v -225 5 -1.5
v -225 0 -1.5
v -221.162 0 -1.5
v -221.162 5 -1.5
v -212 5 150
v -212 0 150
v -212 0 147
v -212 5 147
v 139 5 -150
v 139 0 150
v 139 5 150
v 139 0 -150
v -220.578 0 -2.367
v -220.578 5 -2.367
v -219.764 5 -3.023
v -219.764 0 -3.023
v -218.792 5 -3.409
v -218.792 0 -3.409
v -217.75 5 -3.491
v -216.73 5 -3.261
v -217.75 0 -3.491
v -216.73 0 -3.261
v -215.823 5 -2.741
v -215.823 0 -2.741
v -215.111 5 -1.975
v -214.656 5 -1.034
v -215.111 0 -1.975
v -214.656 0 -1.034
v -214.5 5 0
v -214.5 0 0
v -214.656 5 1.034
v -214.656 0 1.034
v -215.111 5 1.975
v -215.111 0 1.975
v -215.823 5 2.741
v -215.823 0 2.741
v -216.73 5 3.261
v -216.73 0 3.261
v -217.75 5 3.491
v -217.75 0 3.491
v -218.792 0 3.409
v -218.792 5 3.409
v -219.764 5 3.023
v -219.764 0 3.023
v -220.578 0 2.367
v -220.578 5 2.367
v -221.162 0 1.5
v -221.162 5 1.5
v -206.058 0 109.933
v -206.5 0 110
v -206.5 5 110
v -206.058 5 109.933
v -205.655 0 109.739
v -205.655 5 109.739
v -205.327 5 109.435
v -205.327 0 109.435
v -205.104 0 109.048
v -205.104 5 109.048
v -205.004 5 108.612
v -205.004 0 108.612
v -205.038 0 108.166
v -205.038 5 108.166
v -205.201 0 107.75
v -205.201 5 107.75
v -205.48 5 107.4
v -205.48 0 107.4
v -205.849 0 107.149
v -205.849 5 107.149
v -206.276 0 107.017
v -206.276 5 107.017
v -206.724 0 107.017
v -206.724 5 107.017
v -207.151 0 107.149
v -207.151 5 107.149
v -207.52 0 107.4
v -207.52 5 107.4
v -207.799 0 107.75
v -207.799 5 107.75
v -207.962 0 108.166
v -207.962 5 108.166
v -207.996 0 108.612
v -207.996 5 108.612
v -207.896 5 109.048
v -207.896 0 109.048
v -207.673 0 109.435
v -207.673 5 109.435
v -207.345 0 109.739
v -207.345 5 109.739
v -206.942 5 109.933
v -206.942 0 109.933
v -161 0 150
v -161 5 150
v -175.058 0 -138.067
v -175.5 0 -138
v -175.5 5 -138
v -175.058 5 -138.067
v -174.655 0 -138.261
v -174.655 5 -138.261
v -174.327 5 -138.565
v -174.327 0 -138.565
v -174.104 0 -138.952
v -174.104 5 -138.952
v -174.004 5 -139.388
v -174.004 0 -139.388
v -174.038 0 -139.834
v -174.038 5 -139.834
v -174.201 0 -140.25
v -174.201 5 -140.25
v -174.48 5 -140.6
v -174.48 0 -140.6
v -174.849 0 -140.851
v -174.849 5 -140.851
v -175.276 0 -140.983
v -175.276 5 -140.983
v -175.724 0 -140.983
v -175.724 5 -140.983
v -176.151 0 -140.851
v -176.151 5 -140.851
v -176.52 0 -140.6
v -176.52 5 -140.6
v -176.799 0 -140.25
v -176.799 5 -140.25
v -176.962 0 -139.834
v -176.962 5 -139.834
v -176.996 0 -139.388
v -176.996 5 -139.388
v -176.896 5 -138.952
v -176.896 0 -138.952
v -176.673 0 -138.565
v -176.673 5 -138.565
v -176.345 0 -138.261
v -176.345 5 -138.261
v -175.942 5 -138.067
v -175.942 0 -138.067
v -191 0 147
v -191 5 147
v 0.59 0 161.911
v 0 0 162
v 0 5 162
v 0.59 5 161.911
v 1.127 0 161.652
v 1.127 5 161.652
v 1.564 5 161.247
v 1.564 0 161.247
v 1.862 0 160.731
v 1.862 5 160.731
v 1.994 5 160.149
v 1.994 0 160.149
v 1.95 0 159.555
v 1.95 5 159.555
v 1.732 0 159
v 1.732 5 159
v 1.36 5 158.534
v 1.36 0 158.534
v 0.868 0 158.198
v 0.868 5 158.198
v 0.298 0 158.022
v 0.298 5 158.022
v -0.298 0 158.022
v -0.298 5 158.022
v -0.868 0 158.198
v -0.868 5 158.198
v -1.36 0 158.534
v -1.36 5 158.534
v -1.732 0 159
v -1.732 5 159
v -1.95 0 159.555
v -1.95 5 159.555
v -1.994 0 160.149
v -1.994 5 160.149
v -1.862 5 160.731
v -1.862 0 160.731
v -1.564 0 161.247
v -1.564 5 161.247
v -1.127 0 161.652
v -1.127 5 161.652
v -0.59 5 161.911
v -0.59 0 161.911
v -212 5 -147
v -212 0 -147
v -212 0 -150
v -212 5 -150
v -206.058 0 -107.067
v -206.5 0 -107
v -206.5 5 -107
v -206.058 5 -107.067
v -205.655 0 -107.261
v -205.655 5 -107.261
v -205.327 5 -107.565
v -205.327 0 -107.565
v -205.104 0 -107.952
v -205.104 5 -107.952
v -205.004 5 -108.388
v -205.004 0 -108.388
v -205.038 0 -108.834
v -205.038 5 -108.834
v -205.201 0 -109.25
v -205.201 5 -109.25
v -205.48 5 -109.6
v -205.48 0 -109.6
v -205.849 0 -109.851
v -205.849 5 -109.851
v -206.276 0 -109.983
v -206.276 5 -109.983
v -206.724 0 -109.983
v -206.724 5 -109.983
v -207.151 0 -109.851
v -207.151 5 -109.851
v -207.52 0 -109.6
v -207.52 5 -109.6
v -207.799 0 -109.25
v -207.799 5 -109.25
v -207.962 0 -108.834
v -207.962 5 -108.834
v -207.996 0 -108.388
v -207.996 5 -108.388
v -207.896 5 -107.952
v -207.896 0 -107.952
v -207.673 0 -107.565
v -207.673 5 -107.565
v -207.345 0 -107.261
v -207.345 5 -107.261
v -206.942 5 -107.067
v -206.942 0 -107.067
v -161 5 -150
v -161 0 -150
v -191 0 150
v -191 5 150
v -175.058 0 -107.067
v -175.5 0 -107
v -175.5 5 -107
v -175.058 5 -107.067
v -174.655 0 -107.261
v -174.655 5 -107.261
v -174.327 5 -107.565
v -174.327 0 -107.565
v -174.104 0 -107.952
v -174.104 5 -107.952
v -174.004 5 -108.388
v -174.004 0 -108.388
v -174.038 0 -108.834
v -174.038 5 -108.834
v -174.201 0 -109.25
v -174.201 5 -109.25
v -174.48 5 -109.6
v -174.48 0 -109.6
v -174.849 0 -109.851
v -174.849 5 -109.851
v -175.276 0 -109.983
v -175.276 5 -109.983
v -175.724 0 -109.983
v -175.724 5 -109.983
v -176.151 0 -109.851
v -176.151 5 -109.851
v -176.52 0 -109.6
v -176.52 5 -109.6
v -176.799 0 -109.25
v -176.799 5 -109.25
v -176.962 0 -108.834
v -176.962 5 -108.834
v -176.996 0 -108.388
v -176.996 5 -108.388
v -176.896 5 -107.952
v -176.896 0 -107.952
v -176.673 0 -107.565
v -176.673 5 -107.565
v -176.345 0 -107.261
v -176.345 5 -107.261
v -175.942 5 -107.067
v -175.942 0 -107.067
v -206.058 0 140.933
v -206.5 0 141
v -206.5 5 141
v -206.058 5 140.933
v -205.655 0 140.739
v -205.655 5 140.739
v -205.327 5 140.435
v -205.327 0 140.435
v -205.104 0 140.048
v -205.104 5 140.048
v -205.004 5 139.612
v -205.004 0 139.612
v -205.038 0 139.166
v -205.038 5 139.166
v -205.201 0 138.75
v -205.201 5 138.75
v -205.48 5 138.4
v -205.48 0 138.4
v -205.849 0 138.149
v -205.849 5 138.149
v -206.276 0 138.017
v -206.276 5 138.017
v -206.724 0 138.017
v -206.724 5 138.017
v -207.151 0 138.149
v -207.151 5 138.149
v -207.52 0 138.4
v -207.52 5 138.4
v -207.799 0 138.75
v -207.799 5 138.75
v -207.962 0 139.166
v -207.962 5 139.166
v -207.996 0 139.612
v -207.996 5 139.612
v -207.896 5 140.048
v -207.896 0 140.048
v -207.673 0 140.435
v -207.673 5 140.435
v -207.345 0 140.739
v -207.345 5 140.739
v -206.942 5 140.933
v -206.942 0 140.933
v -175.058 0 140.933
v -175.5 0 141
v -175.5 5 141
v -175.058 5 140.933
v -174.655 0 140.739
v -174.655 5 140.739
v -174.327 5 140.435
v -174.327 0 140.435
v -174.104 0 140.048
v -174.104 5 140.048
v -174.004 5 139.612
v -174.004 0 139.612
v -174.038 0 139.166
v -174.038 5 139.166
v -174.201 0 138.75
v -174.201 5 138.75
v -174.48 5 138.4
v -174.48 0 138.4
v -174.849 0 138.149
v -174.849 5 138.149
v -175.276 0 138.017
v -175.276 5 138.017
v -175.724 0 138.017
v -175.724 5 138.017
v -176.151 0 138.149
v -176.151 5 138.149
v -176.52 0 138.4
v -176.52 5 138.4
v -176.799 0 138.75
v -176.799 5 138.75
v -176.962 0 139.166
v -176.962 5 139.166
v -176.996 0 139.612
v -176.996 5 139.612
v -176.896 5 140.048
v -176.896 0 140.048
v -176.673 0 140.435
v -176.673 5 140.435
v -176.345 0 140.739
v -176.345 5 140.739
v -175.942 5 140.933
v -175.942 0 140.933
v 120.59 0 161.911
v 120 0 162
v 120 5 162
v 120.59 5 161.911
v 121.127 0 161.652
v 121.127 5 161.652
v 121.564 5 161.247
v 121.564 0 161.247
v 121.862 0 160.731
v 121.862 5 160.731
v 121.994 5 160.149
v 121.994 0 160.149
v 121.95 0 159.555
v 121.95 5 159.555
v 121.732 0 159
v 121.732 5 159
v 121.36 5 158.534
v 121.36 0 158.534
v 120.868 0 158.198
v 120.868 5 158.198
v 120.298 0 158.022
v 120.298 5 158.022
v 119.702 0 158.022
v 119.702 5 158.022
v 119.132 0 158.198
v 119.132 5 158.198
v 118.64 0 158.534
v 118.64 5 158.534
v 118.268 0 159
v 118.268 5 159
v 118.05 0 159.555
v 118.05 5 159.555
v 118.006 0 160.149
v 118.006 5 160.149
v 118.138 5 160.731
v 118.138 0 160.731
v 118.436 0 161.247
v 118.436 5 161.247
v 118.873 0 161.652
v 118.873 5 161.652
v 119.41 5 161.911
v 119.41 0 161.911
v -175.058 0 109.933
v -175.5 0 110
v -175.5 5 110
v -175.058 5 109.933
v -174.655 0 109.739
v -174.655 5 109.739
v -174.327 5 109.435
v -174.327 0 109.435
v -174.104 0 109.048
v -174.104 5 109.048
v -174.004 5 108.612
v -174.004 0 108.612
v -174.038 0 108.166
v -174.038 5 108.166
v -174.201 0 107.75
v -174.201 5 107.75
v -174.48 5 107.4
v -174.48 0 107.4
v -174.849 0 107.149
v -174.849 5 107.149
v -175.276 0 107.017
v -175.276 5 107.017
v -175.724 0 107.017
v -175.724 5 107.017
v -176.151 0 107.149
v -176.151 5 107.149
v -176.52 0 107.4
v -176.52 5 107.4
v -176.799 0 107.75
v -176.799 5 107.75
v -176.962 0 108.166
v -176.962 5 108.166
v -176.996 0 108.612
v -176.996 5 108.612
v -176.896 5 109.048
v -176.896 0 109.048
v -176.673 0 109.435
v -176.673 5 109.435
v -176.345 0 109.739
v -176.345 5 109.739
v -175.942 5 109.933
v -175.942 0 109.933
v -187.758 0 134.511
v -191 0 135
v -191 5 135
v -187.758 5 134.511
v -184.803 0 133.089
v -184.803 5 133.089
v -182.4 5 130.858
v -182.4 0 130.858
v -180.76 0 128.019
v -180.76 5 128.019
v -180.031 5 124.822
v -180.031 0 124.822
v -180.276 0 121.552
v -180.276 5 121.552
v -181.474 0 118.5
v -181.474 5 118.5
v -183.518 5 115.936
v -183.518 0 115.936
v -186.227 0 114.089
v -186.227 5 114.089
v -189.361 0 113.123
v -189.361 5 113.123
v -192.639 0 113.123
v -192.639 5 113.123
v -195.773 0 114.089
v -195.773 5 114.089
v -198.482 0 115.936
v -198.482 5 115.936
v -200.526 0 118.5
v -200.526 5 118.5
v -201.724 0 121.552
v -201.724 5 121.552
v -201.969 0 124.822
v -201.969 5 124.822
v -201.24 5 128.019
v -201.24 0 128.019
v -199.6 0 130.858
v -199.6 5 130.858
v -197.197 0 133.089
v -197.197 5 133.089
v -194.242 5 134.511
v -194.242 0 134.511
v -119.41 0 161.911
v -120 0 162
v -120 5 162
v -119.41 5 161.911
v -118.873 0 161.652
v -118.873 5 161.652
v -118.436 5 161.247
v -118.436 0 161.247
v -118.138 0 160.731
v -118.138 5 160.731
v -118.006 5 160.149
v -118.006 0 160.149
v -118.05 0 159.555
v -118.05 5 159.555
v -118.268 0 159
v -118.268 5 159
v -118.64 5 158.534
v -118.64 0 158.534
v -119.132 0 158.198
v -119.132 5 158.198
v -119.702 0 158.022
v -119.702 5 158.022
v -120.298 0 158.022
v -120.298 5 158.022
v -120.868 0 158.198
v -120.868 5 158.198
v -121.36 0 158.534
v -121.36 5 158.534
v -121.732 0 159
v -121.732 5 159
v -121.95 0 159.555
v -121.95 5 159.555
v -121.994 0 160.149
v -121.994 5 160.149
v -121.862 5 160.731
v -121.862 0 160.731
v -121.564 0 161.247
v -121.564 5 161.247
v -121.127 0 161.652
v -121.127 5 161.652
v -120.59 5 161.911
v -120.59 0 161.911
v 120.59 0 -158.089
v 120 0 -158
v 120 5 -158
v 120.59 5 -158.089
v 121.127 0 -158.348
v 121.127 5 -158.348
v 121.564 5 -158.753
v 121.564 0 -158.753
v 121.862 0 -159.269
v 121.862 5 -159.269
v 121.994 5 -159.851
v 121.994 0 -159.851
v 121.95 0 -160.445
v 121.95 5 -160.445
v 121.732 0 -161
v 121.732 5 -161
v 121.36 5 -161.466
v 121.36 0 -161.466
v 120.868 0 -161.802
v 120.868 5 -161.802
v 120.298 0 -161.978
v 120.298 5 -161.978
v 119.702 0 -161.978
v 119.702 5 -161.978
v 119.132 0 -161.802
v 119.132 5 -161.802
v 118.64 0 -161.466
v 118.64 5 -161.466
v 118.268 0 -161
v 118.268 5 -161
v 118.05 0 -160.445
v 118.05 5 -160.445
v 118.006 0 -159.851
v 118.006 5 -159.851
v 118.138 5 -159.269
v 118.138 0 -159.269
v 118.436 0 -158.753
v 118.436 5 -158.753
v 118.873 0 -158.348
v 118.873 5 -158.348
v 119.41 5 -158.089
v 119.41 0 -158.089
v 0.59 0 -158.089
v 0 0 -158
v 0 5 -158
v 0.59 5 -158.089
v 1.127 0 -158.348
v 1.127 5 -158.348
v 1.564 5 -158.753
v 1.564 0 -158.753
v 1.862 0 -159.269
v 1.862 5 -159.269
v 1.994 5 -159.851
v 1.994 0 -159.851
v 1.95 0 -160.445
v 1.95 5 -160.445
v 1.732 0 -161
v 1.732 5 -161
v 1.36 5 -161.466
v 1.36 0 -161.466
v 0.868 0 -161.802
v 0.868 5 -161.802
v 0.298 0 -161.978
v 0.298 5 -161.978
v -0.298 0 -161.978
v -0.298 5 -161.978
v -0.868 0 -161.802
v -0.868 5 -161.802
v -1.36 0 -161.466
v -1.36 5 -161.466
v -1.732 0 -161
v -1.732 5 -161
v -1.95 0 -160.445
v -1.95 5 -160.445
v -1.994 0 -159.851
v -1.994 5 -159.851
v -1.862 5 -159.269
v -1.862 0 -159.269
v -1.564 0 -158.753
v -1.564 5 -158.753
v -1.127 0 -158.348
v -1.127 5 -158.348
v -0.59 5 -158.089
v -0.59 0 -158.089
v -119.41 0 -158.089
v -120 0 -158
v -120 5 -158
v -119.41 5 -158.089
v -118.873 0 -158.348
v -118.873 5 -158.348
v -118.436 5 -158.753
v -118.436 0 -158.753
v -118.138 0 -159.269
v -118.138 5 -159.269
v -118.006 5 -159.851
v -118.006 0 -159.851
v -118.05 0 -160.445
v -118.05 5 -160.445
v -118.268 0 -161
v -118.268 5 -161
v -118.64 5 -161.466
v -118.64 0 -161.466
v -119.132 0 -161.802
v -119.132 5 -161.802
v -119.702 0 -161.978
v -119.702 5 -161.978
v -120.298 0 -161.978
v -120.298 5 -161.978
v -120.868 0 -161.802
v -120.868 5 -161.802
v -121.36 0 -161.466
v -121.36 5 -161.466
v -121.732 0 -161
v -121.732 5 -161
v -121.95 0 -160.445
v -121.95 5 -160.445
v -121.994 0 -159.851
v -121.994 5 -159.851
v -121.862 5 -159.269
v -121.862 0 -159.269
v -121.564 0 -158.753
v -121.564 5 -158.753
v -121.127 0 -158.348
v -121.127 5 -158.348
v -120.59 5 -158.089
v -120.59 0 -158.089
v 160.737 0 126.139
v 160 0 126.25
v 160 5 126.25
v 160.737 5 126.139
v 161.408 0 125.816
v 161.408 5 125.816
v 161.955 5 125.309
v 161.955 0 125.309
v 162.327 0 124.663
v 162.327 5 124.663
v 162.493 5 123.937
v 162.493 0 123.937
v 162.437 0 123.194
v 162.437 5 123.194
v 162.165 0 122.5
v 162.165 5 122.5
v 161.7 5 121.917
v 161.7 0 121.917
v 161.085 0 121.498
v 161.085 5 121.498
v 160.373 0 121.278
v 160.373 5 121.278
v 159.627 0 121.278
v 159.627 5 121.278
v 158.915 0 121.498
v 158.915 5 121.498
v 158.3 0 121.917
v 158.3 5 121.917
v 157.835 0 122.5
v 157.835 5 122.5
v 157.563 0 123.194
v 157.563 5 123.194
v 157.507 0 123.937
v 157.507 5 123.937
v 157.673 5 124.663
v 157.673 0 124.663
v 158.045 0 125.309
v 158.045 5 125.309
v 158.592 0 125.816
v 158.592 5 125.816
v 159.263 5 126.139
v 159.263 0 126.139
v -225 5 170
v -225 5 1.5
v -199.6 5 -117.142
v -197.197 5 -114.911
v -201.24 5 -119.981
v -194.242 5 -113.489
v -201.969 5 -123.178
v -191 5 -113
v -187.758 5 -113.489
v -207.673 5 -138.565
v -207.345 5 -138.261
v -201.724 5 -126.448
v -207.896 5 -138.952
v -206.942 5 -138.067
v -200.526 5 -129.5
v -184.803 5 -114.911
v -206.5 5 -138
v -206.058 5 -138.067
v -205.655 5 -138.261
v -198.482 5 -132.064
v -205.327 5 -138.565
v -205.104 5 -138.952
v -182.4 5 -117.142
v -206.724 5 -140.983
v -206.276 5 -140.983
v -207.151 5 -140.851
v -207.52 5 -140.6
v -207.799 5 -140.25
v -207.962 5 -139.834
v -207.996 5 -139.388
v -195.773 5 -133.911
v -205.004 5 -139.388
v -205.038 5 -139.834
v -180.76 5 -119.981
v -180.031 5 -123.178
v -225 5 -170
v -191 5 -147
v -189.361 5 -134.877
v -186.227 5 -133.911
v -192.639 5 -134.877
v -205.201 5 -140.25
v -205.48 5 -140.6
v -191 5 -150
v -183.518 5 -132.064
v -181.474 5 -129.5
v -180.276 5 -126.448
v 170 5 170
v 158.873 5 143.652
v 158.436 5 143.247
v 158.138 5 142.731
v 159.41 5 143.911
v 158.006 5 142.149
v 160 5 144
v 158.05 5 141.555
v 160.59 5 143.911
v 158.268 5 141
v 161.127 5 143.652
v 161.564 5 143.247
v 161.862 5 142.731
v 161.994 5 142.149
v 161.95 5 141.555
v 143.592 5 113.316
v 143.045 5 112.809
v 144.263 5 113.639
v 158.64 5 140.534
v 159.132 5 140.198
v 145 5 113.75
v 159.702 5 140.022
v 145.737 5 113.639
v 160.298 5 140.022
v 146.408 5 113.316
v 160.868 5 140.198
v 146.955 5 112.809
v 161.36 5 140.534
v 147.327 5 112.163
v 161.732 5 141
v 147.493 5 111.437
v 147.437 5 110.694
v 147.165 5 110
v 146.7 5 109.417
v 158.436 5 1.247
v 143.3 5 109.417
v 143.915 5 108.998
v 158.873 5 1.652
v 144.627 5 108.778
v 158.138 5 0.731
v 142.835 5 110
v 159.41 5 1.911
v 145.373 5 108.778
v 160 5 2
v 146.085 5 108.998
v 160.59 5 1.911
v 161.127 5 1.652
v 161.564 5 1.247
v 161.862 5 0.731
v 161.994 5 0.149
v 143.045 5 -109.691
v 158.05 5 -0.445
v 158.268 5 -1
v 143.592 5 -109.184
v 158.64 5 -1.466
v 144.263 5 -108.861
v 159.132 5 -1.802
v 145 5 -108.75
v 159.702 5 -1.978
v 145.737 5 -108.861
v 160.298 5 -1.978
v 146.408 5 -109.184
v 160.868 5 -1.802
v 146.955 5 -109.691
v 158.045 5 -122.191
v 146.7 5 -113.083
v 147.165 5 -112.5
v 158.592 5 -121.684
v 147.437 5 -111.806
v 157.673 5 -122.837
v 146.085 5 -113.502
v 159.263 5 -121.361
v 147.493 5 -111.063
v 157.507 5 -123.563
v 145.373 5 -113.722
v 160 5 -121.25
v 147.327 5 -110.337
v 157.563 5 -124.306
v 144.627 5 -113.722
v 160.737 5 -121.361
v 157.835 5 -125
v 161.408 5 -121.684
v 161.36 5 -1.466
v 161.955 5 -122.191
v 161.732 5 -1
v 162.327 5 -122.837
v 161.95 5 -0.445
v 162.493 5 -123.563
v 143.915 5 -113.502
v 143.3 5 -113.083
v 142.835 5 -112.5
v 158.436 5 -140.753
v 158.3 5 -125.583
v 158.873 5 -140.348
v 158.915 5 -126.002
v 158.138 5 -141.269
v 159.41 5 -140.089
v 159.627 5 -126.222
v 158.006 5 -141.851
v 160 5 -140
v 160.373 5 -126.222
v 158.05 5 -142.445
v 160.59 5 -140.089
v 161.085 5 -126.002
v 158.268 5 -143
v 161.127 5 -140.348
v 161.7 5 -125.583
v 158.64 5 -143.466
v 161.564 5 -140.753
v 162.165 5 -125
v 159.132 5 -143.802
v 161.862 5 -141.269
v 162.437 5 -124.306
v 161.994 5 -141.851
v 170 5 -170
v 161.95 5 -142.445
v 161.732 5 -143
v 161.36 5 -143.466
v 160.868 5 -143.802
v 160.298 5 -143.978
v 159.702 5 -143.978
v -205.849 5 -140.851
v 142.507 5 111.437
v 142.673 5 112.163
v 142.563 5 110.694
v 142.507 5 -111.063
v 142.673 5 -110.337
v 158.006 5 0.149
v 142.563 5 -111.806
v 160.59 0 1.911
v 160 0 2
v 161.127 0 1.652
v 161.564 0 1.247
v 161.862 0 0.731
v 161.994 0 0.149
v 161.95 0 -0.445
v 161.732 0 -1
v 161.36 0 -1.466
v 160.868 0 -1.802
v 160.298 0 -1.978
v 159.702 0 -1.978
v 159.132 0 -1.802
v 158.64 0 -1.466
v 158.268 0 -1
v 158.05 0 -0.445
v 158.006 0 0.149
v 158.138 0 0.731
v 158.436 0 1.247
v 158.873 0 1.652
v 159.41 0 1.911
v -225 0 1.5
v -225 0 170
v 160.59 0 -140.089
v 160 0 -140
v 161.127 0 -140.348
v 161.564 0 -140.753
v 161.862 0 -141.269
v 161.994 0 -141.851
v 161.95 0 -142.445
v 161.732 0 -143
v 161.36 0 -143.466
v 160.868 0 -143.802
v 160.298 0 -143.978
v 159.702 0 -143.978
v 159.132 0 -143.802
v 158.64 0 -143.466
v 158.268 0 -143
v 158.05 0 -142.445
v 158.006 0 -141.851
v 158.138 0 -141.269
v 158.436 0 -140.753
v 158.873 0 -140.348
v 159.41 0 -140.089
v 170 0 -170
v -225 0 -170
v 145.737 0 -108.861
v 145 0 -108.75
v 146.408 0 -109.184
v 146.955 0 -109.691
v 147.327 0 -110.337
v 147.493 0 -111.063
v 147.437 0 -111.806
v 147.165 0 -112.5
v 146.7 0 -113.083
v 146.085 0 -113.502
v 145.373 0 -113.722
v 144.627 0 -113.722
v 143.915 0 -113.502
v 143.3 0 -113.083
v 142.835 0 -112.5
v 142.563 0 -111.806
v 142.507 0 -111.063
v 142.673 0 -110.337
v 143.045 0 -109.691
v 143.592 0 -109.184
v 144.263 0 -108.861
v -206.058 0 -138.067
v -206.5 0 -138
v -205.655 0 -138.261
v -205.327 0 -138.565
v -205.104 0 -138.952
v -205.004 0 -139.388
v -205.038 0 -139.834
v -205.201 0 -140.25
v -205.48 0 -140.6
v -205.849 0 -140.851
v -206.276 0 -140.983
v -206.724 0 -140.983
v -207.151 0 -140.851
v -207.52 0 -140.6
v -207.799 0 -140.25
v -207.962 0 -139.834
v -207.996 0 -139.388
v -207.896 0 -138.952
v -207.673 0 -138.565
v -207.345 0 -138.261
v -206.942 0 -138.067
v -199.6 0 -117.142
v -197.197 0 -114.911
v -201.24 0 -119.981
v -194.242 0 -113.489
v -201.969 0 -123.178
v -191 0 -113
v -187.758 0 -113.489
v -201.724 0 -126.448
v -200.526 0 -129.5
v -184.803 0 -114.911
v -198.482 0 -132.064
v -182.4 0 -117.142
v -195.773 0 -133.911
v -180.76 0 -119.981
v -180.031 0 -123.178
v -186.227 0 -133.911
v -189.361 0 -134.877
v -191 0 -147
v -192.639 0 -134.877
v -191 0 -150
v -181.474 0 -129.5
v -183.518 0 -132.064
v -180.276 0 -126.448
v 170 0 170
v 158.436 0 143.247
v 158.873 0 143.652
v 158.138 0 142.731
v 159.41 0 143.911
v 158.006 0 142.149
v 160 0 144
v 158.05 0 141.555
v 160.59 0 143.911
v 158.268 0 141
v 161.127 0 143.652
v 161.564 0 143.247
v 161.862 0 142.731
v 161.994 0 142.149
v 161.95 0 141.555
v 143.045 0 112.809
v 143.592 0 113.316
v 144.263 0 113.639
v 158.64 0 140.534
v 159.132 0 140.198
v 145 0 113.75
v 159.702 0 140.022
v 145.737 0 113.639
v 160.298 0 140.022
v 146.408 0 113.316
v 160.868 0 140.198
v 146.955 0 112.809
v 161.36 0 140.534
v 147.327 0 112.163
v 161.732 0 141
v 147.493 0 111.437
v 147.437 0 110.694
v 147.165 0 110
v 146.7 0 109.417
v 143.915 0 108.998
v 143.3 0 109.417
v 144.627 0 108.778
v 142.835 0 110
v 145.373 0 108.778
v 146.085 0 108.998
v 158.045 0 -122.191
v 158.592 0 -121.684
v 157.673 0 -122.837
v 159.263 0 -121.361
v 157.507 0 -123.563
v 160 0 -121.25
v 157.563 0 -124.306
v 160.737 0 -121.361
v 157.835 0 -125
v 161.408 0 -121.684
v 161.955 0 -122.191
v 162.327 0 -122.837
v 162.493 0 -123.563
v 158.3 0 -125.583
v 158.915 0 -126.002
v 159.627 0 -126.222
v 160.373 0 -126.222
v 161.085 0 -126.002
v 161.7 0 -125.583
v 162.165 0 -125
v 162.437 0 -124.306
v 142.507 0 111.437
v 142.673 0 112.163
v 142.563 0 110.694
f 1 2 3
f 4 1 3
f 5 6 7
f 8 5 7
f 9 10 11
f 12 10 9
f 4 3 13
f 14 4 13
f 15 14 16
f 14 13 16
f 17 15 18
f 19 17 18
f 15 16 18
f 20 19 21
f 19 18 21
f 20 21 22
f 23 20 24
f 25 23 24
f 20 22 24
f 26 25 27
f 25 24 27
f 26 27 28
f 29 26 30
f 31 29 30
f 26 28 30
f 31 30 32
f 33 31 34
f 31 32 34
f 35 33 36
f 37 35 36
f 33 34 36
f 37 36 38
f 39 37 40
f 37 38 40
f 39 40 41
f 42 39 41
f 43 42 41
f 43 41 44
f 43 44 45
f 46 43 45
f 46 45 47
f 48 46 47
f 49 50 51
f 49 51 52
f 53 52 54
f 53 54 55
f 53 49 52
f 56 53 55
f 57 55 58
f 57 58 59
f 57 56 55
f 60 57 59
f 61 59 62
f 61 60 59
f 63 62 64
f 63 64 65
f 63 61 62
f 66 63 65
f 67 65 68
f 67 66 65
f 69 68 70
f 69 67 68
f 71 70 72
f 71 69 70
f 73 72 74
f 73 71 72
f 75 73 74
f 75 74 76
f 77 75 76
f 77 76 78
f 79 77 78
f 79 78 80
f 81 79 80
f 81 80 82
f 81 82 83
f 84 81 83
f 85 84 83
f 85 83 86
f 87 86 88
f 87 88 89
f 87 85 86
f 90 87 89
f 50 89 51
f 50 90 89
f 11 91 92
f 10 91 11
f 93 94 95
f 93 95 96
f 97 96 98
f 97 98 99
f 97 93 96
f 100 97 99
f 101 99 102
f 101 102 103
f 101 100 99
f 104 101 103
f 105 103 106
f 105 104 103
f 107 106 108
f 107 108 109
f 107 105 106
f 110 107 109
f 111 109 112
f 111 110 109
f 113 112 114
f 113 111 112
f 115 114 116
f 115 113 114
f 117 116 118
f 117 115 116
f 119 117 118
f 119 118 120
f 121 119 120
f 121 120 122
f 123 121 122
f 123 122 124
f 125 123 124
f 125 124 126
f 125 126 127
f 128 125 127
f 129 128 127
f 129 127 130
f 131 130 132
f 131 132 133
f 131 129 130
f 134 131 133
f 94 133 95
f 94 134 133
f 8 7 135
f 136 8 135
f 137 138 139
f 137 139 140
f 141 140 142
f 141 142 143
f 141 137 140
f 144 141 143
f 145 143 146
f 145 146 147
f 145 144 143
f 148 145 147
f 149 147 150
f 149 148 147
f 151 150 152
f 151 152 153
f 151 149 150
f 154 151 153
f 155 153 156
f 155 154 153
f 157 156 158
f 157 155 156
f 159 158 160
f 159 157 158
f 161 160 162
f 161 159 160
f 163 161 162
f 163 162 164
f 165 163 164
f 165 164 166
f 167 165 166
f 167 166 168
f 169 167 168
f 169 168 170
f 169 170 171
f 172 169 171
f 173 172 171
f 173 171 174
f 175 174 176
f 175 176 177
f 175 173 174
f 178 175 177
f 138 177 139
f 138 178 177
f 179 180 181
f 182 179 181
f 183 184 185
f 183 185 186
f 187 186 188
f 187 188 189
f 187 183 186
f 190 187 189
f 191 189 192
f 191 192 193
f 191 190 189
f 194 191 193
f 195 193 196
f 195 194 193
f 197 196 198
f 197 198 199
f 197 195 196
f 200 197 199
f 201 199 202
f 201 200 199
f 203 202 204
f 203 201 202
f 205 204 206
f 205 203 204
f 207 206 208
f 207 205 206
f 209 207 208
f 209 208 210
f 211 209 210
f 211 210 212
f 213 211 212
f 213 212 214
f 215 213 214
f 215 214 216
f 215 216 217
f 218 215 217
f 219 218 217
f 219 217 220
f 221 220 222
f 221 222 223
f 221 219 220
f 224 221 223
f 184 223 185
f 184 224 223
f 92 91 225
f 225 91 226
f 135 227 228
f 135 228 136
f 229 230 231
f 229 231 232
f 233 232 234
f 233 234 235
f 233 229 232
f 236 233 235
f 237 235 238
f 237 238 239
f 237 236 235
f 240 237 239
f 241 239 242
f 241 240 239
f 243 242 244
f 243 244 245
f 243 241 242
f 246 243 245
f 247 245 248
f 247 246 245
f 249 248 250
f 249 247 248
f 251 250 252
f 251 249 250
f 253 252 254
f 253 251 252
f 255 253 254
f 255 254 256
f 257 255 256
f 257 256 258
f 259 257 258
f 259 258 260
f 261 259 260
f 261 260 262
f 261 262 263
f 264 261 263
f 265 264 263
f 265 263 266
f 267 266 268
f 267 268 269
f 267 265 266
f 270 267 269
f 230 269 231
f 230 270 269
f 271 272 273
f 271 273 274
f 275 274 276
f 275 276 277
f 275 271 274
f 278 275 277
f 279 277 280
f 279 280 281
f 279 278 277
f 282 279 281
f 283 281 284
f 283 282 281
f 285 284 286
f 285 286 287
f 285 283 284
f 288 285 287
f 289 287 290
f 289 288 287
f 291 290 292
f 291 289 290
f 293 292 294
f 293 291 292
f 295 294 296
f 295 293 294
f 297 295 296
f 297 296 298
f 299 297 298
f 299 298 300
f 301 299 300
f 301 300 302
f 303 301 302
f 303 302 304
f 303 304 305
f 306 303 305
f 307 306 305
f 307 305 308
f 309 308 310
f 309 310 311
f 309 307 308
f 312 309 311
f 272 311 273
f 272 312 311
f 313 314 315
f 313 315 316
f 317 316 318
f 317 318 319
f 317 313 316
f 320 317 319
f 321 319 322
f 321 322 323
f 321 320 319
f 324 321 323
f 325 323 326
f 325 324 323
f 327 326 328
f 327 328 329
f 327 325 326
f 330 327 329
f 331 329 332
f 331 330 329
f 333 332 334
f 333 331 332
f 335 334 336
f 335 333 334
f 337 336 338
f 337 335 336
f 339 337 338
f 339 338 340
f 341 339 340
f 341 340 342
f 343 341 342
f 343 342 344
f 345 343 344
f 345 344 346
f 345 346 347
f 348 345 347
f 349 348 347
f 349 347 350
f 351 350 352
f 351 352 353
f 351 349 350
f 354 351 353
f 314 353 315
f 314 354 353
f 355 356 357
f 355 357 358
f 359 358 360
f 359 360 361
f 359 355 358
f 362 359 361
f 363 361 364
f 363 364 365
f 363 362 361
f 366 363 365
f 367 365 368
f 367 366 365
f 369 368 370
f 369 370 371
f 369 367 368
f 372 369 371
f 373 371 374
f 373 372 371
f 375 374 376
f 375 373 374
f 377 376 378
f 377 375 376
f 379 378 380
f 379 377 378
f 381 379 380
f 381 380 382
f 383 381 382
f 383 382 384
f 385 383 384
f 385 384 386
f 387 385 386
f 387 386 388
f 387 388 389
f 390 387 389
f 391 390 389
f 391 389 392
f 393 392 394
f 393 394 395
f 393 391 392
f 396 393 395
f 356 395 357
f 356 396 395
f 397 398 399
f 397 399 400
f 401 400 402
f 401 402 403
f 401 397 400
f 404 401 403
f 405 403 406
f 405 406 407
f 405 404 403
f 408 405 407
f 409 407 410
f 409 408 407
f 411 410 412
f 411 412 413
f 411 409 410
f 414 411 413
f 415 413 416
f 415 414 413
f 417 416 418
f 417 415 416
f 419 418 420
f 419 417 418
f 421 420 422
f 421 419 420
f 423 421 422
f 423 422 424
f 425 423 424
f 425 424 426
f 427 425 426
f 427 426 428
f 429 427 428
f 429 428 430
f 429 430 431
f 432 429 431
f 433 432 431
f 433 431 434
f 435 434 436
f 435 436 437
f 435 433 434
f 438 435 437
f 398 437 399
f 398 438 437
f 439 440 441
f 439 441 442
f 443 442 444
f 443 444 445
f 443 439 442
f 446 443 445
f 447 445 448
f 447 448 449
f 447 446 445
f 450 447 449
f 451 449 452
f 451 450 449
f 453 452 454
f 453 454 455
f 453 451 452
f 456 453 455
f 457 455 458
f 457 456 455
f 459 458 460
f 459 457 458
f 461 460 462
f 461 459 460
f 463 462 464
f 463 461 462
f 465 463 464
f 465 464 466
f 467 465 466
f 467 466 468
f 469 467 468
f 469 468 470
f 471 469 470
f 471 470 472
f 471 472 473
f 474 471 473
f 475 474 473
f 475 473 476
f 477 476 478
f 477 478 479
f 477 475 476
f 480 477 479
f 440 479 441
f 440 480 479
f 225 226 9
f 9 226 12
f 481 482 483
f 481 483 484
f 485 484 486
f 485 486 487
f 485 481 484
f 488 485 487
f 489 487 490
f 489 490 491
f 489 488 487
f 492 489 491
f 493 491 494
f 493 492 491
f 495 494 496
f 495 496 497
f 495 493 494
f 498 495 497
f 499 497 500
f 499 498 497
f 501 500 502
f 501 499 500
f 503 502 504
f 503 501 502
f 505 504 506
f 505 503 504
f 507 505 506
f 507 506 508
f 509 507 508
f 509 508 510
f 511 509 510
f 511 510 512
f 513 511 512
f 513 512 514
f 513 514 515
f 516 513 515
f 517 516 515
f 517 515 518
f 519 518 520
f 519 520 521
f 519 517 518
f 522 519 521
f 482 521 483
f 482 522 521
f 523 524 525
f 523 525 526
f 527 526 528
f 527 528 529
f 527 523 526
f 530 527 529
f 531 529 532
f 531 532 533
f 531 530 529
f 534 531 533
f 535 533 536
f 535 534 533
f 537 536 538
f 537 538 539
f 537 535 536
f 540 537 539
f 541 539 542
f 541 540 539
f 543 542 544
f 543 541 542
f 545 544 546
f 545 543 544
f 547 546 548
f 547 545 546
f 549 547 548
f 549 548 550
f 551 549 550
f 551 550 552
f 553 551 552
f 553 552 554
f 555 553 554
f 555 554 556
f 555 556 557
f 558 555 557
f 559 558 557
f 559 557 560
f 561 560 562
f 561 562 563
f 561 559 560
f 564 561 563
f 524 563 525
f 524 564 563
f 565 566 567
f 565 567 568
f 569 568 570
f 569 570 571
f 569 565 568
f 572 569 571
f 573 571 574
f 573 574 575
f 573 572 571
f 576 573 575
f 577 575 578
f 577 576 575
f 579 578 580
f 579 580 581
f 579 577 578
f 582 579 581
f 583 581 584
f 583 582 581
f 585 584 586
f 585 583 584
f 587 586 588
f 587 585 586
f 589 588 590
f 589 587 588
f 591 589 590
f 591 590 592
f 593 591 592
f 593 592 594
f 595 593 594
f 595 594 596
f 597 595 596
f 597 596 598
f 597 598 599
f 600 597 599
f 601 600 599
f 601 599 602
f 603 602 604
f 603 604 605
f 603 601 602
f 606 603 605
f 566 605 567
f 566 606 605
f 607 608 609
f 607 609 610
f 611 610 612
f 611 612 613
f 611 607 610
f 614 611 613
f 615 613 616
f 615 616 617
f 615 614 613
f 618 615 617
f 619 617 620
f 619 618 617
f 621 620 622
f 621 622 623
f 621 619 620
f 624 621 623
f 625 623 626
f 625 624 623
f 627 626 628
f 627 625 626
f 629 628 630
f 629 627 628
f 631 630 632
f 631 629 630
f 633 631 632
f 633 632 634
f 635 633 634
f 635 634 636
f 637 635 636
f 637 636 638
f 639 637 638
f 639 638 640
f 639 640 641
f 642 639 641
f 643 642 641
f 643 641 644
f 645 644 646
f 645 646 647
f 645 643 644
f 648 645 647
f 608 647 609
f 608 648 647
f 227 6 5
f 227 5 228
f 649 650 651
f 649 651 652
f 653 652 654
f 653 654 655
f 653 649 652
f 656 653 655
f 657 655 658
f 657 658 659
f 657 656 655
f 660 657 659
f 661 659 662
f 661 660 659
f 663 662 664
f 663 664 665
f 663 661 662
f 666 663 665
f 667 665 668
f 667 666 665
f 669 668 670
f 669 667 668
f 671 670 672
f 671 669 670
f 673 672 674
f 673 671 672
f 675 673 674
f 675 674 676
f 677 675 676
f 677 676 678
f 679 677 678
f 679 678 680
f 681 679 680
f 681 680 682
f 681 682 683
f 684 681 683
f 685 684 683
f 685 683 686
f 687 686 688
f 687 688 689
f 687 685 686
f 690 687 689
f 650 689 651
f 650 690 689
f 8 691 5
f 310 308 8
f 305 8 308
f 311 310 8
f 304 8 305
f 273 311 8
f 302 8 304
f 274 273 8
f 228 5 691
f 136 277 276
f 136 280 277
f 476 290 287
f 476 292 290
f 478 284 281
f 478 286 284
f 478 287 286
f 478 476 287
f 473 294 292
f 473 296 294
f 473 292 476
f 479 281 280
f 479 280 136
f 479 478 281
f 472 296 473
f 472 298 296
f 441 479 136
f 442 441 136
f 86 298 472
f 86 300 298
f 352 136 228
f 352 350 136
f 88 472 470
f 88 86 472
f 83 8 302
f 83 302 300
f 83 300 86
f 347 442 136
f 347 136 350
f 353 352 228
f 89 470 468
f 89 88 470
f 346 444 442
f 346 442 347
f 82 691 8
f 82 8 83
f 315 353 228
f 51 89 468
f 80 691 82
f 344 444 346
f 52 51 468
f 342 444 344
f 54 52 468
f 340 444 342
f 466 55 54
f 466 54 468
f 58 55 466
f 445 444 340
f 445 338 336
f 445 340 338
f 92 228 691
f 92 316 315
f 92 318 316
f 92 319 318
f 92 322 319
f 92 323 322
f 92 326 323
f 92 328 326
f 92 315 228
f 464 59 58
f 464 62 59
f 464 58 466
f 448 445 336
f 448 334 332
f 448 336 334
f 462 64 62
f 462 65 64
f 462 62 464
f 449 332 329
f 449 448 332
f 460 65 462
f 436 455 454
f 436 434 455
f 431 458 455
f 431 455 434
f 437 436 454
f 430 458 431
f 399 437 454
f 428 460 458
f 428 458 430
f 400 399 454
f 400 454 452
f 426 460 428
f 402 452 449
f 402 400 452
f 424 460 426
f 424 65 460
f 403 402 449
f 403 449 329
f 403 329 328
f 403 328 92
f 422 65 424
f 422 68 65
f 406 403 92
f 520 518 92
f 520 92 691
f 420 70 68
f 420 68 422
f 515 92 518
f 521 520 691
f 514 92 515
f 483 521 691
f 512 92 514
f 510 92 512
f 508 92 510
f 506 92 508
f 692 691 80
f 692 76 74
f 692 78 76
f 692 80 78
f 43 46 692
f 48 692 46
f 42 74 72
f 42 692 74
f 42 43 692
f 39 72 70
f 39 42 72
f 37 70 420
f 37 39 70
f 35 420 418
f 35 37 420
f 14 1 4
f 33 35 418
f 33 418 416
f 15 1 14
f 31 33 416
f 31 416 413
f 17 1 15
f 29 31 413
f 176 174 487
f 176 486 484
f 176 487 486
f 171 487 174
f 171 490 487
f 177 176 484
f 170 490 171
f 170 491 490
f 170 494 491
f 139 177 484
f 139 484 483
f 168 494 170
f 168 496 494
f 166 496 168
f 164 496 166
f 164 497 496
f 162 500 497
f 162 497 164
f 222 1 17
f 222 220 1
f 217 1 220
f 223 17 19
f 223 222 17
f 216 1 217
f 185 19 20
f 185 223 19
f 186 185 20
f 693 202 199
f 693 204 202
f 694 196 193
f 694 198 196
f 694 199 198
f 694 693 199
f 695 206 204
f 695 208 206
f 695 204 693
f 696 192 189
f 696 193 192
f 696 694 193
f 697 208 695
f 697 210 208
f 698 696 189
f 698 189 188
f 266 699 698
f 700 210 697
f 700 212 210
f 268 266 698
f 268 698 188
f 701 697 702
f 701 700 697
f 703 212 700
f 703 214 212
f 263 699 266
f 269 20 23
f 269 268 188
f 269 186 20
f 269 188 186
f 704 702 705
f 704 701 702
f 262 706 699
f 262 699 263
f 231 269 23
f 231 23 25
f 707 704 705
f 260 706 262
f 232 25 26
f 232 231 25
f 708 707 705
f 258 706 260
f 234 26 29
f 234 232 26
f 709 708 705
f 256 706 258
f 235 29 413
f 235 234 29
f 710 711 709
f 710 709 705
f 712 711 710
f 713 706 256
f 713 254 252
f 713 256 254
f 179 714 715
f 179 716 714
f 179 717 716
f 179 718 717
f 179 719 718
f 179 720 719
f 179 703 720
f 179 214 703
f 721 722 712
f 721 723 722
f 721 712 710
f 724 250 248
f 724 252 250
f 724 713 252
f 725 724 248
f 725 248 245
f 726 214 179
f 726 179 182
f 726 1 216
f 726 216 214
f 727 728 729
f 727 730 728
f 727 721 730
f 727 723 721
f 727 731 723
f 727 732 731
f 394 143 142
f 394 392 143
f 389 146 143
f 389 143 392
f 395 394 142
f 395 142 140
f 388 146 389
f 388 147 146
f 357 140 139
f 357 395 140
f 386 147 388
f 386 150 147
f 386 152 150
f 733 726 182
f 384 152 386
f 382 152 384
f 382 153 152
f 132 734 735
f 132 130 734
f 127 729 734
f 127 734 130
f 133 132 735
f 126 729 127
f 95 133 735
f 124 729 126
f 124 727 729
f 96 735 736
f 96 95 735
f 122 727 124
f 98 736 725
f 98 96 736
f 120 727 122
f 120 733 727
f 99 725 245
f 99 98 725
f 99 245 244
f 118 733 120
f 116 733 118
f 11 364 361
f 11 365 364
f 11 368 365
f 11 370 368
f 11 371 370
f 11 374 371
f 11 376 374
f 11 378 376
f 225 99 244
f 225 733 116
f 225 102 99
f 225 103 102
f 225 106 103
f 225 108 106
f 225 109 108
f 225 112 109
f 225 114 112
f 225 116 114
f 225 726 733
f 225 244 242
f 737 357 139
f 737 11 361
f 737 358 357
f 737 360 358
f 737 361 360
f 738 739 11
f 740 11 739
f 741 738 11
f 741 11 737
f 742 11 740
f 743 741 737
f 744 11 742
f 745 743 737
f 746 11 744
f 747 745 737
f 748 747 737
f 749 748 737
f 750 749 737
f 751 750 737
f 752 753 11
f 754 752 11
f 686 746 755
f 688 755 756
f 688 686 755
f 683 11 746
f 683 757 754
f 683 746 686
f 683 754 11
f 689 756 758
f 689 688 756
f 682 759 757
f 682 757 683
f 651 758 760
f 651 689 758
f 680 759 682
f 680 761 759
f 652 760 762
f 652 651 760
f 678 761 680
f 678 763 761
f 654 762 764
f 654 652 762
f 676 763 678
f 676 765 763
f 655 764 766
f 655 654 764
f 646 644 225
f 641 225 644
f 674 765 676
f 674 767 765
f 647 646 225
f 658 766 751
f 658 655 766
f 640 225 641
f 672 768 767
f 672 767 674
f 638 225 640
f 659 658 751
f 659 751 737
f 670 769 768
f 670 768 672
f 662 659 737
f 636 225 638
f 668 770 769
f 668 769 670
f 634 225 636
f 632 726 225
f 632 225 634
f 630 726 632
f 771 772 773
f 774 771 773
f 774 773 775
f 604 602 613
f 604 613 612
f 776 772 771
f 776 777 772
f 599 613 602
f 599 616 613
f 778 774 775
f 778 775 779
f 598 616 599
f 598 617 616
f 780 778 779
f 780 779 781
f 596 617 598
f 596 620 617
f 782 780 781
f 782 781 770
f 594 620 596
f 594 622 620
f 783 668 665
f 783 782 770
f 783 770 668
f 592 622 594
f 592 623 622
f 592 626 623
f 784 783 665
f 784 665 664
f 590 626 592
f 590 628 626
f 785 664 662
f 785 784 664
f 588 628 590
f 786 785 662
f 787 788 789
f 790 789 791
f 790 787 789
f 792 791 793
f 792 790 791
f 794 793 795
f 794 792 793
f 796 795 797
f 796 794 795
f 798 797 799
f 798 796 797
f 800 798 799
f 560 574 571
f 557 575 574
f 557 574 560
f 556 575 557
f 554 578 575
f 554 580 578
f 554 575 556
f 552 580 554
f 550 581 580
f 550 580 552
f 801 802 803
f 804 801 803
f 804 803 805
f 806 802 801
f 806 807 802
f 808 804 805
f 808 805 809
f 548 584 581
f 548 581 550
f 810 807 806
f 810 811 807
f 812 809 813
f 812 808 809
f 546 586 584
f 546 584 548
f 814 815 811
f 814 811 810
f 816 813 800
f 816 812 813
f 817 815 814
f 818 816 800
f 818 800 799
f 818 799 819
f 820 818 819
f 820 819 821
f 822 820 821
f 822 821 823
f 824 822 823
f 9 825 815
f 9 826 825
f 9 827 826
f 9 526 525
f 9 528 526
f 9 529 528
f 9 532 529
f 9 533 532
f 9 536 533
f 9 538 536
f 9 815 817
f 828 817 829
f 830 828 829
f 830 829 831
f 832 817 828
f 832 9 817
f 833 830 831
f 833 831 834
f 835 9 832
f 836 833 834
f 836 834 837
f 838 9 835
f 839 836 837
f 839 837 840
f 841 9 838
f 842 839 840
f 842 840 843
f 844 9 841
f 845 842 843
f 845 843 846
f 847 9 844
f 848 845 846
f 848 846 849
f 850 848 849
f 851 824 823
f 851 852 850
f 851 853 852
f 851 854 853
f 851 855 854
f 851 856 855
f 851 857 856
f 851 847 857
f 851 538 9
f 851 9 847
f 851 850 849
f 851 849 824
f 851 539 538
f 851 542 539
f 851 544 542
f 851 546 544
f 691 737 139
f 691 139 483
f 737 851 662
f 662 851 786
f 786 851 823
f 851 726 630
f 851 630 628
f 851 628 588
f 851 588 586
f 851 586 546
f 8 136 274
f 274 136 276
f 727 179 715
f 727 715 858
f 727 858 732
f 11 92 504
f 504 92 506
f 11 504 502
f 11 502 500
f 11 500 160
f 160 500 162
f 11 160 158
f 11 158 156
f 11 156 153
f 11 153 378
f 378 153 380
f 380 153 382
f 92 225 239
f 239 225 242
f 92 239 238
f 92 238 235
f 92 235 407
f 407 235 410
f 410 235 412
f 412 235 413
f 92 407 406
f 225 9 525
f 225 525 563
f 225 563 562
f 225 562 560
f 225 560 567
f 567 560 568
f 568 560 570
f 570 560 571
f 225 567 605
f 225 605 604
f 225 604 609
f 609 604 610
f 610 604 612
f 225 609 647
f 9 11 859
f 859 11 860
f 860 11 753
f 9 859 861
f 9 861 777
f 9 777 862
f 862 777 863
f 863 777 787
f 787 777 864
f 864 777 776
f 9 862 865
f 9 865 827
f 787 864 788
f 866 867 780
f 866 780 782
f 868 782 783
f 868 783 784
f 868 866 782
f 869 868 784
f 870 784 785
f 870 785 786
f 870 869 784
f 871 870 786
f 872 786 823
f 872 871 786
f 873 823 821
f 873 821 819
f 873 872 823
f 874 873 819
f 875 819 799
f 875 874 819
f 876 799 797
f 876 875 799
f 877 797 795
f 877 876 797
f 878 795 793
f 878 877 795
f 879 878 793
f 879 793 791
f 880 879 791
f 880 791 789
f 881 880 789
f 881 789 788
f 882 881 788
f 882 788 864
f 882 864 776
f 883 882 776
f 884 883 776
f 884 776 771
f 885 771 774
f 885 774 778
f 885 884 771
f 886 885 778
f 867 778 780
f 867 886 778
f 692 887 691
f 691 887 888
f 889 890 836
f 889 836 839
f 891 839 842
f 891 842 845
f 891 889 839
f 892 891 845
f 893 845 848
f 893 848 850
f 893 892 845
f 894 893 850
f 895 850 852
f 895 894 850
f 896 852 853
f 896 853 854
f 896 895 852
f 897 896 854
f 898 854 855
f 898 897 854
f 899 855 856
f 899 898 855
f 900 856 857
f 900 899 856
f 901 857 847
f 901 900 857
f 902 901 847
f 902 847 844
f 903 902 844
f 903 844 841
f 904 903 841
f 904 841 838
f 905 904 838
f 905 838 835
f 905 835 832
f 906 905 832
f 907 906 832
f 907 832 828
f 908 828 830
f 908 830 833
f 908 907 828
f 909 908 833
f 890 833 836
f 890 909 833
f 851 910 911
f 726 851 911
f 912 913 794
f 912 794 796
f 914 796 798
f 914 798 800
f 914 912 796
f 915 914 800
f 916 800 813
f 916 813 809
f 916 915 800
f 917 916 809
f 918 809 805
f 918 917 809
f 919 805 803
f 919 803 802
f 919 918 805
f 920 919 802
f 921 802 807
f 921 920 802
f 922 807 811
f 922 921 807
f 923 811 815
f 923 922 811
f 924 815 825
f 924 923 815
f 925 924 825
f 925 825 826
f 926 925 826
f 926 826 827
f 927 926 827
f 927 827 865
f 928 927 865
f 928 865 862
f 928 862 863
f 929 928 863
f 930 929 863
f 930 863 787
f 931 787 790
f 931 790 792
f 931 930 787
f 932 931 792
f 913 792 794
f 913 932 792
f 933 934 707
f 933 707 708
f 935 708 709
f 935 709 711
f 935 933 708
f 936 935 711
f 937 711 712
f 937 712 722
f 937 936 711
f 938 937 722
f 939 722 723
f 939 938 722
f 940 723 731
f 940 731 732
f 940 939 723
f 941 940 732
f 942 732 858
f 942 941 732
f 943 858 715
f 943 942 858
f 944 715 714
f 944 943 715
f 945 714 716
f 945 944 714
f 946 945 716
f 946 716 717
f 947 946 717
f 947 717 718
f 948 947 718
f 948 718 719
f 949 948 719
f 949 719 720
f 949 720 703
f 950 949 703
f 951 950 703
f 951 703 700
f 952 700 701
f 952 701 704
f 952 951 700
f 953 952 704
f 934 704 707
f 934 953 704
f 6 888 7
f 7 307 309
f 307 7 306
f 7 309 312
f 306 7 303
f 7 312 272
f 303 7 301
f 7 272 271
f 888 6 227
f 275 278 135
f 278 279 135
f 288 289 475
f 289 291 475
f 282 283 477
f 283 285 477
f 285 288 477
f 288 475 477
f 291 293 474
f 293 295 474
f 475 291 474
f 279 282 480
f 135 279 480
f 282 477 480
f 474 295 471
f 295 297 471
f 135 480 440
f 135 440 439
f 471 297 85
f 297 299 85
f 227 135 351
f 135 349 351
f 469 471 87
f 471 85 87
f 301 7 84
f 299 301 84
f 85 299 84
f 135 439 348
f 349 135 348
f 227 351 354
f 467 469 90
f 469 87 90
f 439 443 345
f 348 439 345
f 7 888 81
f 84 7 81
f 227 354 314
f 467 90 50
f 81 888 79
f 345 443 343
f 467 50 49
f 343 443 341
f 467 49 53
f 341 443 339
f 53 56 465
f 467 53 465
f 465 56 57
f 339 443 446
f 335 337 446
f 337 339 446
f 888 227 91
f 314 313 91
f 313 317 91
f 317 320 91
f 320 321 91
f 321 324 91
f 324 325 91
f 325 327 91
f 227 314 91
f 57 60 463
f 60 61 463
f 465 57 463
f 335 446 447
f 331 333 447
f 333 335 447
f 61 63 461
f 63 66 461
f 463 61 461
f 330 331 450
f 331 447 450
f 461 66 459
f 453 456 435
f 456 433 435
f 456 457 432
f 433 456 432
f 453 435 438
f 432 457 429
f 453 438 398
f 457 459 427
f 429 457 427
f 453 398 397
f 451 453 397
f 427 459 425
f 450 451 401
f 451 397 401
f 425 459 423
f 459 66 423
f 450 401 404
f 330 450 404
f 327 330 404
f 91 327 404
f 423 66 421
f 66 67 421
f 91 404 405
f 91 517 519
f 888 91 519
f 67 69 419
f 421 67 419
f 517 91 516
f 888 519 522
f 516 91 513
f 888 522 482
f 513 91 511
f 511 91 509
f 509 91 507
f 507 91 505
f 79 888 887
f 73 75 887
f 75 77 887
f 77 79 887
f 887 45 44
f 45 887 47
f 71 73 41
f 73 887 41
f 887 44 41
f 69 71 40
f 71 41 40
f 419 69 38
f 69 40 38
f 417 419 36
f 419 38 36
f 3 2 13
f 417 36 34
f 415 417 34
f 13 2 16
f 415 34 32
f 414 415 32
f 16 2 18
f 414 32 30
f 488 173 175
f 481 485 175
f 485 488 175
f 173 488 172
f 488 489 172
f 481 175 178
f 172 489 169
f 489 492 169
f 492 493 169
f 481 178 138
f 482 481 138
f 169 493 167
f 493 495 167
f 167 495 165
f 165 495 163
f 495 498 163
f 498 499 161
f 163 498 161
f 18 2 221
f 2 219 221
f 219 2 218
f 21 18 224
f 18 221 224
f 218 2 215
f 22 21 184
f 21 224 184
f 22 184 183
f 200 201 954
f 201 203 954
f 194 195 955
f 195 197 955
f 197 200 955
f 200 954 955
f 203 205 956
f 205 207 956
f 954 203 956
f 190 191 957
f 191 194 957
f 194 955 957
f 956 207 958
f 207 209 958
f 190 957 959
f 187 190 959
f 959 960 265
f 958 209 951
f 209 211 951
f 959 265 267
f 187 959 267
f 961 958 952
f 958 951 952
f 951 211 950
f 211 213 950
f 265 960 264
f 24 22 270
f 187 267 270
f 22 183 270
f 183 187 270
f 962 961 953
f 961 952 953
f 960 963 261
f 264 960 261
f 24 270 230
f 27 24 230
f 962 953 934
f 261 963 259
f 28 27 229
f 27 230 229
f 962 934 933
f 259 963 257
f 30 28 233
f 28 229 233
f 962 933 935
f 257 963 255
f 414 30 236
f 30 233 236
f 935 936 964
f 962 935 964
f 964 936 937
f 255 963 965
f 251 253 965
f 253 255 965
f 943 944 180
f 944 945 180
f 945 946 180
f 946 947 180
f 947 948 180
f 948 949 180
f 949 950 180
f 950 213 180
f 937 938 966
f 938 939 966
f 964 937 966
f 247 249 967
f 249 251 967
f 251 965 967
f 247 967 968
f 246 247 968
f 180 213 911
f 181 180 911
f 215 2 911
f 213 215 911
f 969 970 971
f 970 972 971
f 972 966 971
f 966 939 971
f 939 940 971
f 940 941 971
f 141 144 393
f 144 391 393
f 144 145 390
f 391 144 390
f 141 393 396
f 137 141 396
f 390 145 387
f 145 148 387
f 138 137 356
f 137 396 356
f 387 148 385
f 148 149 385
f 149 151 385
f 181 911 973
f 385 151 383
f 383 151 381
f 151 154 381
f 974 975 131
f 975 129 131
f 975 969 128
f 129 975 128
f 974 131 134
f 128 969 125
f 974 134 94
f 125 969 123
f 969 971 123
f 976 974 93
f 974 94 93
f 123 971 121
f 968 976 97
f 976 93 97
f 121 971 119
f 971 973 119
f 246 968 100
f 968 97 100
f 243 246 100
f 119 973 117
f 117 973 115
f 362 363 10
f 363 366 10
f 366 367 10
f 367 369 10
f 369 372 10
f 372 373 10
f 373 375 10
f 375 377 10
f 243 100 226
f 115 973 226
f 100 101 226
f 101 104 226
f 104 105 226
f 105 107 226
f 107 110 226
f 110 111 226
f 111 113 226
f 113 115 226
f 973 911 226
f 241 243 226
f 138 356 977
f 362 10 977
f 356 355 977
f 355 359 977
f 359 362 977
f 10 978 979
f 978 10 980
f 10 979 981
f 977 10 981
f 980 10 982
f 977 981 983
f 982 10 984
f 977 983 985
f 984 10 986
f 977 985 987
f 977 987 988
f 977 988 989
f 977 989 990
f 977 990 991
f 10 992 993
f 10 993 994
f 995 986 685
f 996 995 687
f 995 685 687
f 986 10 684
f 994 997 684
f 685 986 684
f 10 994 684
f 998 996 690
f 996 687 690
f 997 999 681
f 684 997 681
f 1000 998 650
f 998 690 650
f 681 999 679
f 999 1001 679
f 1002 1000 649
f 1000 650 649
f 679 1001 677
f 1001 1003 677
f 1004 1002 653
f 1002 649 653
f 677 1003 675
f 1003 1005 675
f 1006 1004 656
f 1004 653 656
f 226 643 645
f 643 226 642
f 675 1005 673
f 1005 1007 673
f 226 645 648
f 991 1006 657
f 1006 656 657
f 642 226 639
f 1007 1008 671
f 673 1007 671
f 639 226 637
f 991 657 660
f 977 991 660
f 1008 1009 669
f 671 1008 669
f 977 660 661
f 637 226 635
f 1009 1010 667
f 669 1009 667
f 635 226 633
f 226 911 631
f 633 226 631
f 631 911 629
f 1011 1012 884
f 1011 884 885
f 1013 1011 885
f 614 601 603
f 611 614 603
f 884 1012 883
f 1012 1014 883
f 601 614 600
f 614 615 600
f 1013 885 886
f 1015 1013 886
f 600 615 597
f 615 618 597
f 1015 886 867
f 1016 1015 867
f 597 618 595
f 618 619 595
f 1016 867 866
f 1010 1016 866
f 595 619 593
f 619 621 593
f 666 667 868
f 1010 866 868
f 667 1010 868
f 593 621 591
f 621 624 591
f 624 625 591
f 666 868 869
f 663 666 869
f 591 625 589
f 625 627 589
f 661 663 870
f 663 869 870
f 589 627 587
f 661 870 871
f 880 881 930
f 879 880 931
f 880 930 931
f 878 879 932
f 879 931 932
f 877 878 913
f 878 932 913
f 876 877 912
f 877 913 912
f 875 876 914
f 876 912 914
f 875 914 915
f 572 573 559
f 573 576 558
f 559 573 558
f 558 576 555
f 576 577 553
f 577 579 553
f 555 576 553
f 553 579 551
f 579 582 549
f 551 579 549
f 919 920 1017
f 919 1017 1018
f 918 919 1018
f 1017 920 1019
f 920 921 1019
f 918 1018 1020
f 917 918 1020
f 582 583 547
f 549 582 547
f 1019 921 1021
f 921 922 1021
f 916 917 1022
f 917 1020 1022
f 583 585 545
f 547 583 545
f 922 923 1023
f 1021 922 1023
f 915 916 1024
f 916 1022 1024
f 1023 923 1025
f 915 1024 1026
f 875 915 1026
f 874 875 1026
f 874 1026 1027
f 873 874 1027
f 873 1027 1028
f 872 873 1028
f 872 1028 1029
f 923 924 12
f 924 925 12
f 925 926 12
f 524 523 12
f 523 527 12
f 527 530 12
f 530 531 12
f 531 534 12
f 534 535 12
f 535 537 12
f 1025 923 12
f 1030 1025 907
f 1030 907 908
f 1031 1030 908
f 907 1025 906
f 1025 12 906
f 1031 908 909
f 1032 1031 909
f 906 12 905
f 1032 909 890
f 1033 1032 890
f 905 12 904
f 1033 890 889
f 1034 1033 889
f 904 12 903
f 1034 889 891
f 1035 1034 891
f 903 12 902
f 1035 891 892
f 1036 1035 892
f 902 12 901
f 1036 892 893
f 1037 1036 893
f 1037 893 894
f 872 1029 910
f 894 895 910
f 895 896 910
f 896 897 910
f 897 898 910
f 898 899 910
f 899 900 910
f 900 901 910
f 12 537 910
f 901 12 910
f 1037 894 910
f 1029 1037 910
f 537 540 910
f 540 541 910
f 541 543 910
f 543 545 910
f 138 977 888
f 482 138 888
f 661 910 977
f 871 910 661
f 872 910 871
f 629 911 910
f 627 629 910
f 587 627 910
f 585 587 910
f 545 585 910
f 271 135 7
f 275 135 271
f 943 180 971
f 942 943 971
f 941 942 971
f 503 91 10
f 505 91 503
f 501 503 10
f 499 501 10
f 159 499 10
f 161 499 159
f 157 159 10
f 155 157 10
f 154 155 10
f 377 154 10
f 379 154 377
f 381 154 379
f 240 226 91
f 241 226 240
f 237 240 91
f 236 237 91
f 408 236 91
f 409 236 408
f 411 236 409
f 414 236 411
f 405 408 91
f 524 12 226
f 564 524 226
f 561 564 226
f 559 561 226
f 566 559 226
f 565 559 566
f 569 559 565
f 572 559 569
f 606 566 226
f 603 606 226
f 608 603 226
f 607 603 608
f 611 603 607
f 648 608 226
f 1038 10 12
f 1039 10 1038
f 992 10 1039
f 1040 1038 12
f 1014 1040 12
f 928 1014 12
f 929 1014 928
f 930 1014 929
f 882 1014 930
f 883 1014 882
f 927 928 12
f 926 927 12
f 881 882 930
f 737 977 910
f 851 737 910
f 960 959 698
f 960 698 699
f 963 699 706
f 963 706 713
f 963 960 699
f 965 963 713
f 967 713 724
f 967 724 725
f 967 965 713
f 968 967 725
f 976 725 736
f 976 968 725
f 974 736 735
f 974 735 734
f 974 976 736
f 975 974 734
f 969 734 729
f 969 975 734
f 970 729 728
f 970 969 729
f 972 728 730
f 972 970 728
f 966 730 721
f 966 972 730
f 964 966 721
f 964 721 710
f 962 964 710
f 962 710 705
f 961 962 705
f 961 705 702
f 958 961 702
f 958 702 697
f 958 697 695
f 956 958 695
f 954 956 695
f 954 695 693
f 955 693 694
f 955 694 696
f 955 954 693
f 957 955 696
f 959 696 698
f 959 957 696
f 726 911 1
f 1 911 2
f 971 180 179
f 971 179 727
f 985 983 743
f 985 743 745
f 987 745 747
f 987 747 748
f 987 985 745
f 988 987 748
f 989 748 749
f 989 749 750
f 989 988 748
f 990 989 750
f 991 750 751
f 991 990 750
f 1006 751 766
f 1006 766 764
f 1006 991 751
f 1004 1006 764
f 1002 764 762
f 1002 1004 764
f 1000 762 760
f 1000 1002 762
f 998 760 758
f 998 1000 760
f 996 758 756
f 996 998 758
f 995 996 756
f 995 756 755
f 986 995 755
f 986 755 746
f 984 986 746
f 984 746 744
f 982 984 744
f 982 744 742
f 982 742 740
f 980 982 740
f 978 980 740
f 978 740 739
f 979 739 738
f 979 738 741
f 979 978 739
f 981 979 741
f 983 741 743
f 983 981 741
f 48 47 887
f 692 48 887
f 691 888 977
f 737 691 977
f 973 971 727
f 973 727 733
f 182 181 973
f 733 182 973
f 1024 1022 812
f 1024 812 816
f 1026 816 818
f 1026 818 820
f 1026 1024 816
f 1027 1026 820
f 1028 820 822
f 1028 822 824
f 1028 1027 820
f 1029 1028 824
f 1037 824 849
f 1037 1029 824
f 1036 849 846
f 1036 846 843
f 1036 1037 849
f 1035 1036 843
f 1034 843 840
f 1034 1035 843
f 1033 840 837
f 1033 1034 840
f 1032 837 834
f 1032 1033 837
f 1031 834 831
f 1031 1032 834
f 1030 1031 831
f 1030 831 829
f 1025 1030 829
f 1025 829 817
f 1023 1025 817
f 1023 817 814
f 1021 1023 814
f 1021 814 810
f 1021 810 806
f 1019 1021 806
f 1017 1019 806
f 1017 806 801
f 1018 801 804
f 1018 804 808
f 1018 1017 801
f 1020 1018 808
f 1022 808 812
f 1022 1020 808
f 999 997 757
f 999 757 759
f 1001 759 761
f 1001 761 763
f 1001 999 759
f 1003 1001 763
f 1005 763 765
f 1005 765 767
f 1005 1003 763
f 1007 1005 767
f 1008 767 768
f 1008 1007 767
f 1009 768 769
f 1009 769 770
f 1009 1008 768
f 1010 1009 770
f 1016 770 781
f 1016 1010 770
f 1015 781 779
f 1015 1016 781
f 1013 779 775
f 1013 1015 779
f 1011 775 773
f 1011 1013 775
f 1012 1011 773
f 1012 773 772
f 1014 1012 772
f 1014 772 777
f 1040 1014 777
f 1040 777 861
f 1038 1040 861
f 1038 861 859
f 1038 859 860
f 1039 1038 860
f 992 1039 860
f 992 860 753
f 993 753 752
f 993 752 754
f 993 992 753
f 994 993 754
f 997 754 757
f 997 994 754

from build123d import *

# Parameters (mm, degrees)
SKETCH1_9_W         = 300
SKETCH1_9_H         = 300
SKETCH1_9_R         = 2
SKETCH1_9_R_2       = 2.5
SKETCH1_9_W_2       = 21
SKETCH1_9_H_2       = 3
SKETCH1_9_R_3       = 11
SKETCH1_9_R_4       = 1.5
BOSS_EXTRUDE7_DEPTH = 5


with BuildPart() as part:
    # Sketch1<9> → Boss-Extrude7 (new body)
    with BuildSketch(Plane(origin=(0, 0, 0), x_dir=(1, 0, 0), z_dir=(0, 1, 0))):
        with BuildLine():
            Line((170, 170), (-225, 170))
            Line((-225, 170), (-225, 1.5))
            Line((-225, 1.5), (-221.16227766, 1.5))
            ThreePointArc((-221.16227766, 1.5), (-214.5, 0), (-221.16227766, -1.5))
            Line((-221.16227766, -1.5), (-225, -1.5))
            Line((-225, -1.5), (-225, -170))
            Line((-225, -170), (170, -170))
            Line((170, -170), (170, 170))
        make_face()
        with Locations((-11, 0)):
            Rectangle(SKETCH1_9_W, SKETCH1_9_H, mode=Mode.SUBTRACT)
        with Locations((160, -142)):
            Circle(SKETCH1_9_R, mode=Mode.SUBTRACT)
        with Locations((160, -123.75)):
            Circle(SKETCH1_9_R_2, mode=Mode.SUBTRACT)
        with Locations((145, -111.25)):
            Circle(SKETCH1_9_R_2, mode=Mode.SUBTRACT)
        with Locations((160, 0)):
            Circle(SKETCH1_9_R, mode=Mode.SUBTRACT)
        with Locations((145, 111.25)):
            Circle(SKETCH1_9_R_2, mode=Mode.SUBTRACT)
        with Locations((160, 123.75)):
            Circle(SKETCH1_9_R_2, mode=Mode.SUBTRACT)
        with Locations((160, 142)):
            Circle(SKETCH1_9_R, mode=Mode.SUBTRACT)
        with Locations((120, -160)):
            Circle(SKETCH1_9_R, mode=Mode.SUBTRACT)
        with Locations((-120, -160)):
            Circle(SKETCH1_9_R, mode=Mode.SUBTRACT)
        with Locations((0, -160)):
            Circle(SKETCH1_9_R, mode=Mode.SUBTRACT)
        with Locations((120, 160)):
            Circle(SKETCH1_9_R, mode=Mode.SUBTRACT)
        with Locations((-120, 160)):
            Circle(SKETCH1_9_R, mode=Mode.SUBTRACT)
        with Locations((0, 160)):
            Circle(SKETCH1_9_R, mode=Mode.SUBTRACT)
        with Locations((-201.5, 148.5)):
            Rectangle(SKETCH1_9_W_2, SKETCH1_9_H_2, mode=Mode.SUBTRACT)
        with Locations((-201.5, -148.5)):
            Rectangle(SKETCH1_9_W_2, SKETCH1_9_H_2, mode=Mode.SUBTRACT)
        with Locations((-191, -124)):
            Circle(SKETCH1_9_R_3, mode=Mode.SUBTRACT)
        with Locations((-206.5, -108.5)):
            Circle(SKETCH1_9_R_4, mode=Mode.SUBTRACT)
        with Locations((-175.5, -108.5)):
            Circle(SKETCH1_9_R_4, mode=Mode.SUBTRACT)
        with Locations((-206.5, -139.5)):
            Circle(SKETCH1_9_R_4, mode=Mode.SUBTRACT)
        with Locations((-175.5, -139.5)):
            Circle(SKETCH1_9_R_4, mode=Mode.SUBTRACT)
        with Locations((-175.5, 139.5)):
            Circle(SKETCH1_9_R_4, mode=Mode.SUBTRACT)
        with Locations((-175.5, 108.5)):
            Circle(SKETCH1_9_R_4, mode=Mode.SUBTRACT)
        with Locations((-206.5, 139.5)):
            Circle(SKETCH1_9_R_4, mode=Mode.SUBTRACT)
        with Locations((-206.5, 108.5)):
            Circle(SKETCH1_9_R_4, mode=Mode.SUBTRACT)
        with Locations((-191, 124)):
            Circle(SKETCH1_9_R_3, mode=Mode.SUBTRACT)
    extrude(amount=BOSS_EXTRUDE7_DEPTH)


solid = part.part
